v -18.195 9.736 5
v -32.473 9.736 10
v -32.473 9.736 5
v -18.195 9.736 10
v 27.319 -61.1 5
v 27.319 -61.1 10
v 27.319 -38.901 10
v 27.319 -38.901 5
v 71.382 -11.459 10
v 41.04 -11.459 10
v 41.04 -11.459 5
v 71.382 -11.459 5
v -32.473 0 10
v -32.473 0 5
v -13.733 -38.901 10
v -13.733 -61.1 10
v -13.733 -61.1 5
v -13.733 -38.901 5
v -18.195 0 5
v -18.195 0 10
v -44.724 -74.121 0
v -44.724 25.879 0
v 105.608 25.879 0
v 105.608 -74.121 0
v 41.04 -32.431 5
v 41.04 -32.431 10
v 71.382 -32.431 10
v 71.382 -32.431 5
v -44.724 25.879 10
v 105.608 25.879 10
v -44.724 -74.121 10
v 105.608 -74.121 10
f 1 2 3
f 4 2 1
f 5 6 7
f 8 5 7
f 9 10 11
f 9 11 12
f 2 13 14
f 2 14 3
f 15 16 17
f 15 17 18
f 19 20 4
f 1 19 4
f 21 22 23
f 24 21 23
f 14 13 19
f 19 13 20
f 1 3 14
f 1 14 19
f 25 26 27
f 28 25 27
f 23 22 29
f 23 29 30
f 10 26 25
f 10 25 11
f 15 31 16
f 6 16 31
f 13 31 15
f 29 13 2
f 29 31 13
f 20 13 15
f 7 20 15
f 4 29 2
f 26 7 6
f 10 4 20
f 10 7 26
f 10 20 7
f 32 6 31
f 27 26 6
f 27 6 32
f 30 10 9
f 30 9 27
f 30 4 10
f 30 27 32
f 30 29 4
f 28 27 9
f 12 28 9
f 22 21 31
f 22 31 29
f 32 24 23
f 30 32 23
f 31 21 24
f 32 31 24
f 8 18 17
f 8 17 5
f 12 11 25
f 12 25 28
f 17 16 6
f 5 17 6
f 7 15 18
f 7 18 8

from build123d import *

# Parameters (mm, degrees)
SKETCH1_W           = 150.33165829
SKETCH1_H           = 100
BOSS_EXTRUDE1_DEPTH = 10
SKETCH2_W           = 14.278709015
SKETCH2_H           = 9.735554689
SKETCH2_W_2         = 30.342256657
SKETCH2_H_2         = 20.971853865
SKETCH2_W_3         = 41.051288419
SKETCH2_H_3         = 22.198930422
CUT_EXTRUDE1_DEPTH  = 5


with BuildPart() as part:
    # Sketch1 → Boss-Extrude1 (new body)
    with BuildSketch(Plane.XY):
        with Locations((30.442211055, -24.120603015)):
            Rectangle(SKETCH1_W, SKETCH1_H)
    extrude(amount=BOSS_EXTRUDE1_DEPTH)

    # Sketch2 → Cut-Extrude1 (cut)
    with BuildSketch(Plane.XY.offset(10)):
        with Locations((-25.333996036, 4.867777345)):
            Rectangle(SKETCH2_W, SKETCH2_H)
        with Locations((56.210818731, -21.945330938)):
            Rectangle(SKETCH2_W_2, SKETCH2_H_2)
        with Locations((6.793099248, -50.000763105)):
            Rectangle(SKETCH2_W_3, SKETCH2_H_3)
    extrude(amount=-CUT_EXTRUDE1_DEPTH, mode=Mode.SUBTRACT)


solid = part.part
